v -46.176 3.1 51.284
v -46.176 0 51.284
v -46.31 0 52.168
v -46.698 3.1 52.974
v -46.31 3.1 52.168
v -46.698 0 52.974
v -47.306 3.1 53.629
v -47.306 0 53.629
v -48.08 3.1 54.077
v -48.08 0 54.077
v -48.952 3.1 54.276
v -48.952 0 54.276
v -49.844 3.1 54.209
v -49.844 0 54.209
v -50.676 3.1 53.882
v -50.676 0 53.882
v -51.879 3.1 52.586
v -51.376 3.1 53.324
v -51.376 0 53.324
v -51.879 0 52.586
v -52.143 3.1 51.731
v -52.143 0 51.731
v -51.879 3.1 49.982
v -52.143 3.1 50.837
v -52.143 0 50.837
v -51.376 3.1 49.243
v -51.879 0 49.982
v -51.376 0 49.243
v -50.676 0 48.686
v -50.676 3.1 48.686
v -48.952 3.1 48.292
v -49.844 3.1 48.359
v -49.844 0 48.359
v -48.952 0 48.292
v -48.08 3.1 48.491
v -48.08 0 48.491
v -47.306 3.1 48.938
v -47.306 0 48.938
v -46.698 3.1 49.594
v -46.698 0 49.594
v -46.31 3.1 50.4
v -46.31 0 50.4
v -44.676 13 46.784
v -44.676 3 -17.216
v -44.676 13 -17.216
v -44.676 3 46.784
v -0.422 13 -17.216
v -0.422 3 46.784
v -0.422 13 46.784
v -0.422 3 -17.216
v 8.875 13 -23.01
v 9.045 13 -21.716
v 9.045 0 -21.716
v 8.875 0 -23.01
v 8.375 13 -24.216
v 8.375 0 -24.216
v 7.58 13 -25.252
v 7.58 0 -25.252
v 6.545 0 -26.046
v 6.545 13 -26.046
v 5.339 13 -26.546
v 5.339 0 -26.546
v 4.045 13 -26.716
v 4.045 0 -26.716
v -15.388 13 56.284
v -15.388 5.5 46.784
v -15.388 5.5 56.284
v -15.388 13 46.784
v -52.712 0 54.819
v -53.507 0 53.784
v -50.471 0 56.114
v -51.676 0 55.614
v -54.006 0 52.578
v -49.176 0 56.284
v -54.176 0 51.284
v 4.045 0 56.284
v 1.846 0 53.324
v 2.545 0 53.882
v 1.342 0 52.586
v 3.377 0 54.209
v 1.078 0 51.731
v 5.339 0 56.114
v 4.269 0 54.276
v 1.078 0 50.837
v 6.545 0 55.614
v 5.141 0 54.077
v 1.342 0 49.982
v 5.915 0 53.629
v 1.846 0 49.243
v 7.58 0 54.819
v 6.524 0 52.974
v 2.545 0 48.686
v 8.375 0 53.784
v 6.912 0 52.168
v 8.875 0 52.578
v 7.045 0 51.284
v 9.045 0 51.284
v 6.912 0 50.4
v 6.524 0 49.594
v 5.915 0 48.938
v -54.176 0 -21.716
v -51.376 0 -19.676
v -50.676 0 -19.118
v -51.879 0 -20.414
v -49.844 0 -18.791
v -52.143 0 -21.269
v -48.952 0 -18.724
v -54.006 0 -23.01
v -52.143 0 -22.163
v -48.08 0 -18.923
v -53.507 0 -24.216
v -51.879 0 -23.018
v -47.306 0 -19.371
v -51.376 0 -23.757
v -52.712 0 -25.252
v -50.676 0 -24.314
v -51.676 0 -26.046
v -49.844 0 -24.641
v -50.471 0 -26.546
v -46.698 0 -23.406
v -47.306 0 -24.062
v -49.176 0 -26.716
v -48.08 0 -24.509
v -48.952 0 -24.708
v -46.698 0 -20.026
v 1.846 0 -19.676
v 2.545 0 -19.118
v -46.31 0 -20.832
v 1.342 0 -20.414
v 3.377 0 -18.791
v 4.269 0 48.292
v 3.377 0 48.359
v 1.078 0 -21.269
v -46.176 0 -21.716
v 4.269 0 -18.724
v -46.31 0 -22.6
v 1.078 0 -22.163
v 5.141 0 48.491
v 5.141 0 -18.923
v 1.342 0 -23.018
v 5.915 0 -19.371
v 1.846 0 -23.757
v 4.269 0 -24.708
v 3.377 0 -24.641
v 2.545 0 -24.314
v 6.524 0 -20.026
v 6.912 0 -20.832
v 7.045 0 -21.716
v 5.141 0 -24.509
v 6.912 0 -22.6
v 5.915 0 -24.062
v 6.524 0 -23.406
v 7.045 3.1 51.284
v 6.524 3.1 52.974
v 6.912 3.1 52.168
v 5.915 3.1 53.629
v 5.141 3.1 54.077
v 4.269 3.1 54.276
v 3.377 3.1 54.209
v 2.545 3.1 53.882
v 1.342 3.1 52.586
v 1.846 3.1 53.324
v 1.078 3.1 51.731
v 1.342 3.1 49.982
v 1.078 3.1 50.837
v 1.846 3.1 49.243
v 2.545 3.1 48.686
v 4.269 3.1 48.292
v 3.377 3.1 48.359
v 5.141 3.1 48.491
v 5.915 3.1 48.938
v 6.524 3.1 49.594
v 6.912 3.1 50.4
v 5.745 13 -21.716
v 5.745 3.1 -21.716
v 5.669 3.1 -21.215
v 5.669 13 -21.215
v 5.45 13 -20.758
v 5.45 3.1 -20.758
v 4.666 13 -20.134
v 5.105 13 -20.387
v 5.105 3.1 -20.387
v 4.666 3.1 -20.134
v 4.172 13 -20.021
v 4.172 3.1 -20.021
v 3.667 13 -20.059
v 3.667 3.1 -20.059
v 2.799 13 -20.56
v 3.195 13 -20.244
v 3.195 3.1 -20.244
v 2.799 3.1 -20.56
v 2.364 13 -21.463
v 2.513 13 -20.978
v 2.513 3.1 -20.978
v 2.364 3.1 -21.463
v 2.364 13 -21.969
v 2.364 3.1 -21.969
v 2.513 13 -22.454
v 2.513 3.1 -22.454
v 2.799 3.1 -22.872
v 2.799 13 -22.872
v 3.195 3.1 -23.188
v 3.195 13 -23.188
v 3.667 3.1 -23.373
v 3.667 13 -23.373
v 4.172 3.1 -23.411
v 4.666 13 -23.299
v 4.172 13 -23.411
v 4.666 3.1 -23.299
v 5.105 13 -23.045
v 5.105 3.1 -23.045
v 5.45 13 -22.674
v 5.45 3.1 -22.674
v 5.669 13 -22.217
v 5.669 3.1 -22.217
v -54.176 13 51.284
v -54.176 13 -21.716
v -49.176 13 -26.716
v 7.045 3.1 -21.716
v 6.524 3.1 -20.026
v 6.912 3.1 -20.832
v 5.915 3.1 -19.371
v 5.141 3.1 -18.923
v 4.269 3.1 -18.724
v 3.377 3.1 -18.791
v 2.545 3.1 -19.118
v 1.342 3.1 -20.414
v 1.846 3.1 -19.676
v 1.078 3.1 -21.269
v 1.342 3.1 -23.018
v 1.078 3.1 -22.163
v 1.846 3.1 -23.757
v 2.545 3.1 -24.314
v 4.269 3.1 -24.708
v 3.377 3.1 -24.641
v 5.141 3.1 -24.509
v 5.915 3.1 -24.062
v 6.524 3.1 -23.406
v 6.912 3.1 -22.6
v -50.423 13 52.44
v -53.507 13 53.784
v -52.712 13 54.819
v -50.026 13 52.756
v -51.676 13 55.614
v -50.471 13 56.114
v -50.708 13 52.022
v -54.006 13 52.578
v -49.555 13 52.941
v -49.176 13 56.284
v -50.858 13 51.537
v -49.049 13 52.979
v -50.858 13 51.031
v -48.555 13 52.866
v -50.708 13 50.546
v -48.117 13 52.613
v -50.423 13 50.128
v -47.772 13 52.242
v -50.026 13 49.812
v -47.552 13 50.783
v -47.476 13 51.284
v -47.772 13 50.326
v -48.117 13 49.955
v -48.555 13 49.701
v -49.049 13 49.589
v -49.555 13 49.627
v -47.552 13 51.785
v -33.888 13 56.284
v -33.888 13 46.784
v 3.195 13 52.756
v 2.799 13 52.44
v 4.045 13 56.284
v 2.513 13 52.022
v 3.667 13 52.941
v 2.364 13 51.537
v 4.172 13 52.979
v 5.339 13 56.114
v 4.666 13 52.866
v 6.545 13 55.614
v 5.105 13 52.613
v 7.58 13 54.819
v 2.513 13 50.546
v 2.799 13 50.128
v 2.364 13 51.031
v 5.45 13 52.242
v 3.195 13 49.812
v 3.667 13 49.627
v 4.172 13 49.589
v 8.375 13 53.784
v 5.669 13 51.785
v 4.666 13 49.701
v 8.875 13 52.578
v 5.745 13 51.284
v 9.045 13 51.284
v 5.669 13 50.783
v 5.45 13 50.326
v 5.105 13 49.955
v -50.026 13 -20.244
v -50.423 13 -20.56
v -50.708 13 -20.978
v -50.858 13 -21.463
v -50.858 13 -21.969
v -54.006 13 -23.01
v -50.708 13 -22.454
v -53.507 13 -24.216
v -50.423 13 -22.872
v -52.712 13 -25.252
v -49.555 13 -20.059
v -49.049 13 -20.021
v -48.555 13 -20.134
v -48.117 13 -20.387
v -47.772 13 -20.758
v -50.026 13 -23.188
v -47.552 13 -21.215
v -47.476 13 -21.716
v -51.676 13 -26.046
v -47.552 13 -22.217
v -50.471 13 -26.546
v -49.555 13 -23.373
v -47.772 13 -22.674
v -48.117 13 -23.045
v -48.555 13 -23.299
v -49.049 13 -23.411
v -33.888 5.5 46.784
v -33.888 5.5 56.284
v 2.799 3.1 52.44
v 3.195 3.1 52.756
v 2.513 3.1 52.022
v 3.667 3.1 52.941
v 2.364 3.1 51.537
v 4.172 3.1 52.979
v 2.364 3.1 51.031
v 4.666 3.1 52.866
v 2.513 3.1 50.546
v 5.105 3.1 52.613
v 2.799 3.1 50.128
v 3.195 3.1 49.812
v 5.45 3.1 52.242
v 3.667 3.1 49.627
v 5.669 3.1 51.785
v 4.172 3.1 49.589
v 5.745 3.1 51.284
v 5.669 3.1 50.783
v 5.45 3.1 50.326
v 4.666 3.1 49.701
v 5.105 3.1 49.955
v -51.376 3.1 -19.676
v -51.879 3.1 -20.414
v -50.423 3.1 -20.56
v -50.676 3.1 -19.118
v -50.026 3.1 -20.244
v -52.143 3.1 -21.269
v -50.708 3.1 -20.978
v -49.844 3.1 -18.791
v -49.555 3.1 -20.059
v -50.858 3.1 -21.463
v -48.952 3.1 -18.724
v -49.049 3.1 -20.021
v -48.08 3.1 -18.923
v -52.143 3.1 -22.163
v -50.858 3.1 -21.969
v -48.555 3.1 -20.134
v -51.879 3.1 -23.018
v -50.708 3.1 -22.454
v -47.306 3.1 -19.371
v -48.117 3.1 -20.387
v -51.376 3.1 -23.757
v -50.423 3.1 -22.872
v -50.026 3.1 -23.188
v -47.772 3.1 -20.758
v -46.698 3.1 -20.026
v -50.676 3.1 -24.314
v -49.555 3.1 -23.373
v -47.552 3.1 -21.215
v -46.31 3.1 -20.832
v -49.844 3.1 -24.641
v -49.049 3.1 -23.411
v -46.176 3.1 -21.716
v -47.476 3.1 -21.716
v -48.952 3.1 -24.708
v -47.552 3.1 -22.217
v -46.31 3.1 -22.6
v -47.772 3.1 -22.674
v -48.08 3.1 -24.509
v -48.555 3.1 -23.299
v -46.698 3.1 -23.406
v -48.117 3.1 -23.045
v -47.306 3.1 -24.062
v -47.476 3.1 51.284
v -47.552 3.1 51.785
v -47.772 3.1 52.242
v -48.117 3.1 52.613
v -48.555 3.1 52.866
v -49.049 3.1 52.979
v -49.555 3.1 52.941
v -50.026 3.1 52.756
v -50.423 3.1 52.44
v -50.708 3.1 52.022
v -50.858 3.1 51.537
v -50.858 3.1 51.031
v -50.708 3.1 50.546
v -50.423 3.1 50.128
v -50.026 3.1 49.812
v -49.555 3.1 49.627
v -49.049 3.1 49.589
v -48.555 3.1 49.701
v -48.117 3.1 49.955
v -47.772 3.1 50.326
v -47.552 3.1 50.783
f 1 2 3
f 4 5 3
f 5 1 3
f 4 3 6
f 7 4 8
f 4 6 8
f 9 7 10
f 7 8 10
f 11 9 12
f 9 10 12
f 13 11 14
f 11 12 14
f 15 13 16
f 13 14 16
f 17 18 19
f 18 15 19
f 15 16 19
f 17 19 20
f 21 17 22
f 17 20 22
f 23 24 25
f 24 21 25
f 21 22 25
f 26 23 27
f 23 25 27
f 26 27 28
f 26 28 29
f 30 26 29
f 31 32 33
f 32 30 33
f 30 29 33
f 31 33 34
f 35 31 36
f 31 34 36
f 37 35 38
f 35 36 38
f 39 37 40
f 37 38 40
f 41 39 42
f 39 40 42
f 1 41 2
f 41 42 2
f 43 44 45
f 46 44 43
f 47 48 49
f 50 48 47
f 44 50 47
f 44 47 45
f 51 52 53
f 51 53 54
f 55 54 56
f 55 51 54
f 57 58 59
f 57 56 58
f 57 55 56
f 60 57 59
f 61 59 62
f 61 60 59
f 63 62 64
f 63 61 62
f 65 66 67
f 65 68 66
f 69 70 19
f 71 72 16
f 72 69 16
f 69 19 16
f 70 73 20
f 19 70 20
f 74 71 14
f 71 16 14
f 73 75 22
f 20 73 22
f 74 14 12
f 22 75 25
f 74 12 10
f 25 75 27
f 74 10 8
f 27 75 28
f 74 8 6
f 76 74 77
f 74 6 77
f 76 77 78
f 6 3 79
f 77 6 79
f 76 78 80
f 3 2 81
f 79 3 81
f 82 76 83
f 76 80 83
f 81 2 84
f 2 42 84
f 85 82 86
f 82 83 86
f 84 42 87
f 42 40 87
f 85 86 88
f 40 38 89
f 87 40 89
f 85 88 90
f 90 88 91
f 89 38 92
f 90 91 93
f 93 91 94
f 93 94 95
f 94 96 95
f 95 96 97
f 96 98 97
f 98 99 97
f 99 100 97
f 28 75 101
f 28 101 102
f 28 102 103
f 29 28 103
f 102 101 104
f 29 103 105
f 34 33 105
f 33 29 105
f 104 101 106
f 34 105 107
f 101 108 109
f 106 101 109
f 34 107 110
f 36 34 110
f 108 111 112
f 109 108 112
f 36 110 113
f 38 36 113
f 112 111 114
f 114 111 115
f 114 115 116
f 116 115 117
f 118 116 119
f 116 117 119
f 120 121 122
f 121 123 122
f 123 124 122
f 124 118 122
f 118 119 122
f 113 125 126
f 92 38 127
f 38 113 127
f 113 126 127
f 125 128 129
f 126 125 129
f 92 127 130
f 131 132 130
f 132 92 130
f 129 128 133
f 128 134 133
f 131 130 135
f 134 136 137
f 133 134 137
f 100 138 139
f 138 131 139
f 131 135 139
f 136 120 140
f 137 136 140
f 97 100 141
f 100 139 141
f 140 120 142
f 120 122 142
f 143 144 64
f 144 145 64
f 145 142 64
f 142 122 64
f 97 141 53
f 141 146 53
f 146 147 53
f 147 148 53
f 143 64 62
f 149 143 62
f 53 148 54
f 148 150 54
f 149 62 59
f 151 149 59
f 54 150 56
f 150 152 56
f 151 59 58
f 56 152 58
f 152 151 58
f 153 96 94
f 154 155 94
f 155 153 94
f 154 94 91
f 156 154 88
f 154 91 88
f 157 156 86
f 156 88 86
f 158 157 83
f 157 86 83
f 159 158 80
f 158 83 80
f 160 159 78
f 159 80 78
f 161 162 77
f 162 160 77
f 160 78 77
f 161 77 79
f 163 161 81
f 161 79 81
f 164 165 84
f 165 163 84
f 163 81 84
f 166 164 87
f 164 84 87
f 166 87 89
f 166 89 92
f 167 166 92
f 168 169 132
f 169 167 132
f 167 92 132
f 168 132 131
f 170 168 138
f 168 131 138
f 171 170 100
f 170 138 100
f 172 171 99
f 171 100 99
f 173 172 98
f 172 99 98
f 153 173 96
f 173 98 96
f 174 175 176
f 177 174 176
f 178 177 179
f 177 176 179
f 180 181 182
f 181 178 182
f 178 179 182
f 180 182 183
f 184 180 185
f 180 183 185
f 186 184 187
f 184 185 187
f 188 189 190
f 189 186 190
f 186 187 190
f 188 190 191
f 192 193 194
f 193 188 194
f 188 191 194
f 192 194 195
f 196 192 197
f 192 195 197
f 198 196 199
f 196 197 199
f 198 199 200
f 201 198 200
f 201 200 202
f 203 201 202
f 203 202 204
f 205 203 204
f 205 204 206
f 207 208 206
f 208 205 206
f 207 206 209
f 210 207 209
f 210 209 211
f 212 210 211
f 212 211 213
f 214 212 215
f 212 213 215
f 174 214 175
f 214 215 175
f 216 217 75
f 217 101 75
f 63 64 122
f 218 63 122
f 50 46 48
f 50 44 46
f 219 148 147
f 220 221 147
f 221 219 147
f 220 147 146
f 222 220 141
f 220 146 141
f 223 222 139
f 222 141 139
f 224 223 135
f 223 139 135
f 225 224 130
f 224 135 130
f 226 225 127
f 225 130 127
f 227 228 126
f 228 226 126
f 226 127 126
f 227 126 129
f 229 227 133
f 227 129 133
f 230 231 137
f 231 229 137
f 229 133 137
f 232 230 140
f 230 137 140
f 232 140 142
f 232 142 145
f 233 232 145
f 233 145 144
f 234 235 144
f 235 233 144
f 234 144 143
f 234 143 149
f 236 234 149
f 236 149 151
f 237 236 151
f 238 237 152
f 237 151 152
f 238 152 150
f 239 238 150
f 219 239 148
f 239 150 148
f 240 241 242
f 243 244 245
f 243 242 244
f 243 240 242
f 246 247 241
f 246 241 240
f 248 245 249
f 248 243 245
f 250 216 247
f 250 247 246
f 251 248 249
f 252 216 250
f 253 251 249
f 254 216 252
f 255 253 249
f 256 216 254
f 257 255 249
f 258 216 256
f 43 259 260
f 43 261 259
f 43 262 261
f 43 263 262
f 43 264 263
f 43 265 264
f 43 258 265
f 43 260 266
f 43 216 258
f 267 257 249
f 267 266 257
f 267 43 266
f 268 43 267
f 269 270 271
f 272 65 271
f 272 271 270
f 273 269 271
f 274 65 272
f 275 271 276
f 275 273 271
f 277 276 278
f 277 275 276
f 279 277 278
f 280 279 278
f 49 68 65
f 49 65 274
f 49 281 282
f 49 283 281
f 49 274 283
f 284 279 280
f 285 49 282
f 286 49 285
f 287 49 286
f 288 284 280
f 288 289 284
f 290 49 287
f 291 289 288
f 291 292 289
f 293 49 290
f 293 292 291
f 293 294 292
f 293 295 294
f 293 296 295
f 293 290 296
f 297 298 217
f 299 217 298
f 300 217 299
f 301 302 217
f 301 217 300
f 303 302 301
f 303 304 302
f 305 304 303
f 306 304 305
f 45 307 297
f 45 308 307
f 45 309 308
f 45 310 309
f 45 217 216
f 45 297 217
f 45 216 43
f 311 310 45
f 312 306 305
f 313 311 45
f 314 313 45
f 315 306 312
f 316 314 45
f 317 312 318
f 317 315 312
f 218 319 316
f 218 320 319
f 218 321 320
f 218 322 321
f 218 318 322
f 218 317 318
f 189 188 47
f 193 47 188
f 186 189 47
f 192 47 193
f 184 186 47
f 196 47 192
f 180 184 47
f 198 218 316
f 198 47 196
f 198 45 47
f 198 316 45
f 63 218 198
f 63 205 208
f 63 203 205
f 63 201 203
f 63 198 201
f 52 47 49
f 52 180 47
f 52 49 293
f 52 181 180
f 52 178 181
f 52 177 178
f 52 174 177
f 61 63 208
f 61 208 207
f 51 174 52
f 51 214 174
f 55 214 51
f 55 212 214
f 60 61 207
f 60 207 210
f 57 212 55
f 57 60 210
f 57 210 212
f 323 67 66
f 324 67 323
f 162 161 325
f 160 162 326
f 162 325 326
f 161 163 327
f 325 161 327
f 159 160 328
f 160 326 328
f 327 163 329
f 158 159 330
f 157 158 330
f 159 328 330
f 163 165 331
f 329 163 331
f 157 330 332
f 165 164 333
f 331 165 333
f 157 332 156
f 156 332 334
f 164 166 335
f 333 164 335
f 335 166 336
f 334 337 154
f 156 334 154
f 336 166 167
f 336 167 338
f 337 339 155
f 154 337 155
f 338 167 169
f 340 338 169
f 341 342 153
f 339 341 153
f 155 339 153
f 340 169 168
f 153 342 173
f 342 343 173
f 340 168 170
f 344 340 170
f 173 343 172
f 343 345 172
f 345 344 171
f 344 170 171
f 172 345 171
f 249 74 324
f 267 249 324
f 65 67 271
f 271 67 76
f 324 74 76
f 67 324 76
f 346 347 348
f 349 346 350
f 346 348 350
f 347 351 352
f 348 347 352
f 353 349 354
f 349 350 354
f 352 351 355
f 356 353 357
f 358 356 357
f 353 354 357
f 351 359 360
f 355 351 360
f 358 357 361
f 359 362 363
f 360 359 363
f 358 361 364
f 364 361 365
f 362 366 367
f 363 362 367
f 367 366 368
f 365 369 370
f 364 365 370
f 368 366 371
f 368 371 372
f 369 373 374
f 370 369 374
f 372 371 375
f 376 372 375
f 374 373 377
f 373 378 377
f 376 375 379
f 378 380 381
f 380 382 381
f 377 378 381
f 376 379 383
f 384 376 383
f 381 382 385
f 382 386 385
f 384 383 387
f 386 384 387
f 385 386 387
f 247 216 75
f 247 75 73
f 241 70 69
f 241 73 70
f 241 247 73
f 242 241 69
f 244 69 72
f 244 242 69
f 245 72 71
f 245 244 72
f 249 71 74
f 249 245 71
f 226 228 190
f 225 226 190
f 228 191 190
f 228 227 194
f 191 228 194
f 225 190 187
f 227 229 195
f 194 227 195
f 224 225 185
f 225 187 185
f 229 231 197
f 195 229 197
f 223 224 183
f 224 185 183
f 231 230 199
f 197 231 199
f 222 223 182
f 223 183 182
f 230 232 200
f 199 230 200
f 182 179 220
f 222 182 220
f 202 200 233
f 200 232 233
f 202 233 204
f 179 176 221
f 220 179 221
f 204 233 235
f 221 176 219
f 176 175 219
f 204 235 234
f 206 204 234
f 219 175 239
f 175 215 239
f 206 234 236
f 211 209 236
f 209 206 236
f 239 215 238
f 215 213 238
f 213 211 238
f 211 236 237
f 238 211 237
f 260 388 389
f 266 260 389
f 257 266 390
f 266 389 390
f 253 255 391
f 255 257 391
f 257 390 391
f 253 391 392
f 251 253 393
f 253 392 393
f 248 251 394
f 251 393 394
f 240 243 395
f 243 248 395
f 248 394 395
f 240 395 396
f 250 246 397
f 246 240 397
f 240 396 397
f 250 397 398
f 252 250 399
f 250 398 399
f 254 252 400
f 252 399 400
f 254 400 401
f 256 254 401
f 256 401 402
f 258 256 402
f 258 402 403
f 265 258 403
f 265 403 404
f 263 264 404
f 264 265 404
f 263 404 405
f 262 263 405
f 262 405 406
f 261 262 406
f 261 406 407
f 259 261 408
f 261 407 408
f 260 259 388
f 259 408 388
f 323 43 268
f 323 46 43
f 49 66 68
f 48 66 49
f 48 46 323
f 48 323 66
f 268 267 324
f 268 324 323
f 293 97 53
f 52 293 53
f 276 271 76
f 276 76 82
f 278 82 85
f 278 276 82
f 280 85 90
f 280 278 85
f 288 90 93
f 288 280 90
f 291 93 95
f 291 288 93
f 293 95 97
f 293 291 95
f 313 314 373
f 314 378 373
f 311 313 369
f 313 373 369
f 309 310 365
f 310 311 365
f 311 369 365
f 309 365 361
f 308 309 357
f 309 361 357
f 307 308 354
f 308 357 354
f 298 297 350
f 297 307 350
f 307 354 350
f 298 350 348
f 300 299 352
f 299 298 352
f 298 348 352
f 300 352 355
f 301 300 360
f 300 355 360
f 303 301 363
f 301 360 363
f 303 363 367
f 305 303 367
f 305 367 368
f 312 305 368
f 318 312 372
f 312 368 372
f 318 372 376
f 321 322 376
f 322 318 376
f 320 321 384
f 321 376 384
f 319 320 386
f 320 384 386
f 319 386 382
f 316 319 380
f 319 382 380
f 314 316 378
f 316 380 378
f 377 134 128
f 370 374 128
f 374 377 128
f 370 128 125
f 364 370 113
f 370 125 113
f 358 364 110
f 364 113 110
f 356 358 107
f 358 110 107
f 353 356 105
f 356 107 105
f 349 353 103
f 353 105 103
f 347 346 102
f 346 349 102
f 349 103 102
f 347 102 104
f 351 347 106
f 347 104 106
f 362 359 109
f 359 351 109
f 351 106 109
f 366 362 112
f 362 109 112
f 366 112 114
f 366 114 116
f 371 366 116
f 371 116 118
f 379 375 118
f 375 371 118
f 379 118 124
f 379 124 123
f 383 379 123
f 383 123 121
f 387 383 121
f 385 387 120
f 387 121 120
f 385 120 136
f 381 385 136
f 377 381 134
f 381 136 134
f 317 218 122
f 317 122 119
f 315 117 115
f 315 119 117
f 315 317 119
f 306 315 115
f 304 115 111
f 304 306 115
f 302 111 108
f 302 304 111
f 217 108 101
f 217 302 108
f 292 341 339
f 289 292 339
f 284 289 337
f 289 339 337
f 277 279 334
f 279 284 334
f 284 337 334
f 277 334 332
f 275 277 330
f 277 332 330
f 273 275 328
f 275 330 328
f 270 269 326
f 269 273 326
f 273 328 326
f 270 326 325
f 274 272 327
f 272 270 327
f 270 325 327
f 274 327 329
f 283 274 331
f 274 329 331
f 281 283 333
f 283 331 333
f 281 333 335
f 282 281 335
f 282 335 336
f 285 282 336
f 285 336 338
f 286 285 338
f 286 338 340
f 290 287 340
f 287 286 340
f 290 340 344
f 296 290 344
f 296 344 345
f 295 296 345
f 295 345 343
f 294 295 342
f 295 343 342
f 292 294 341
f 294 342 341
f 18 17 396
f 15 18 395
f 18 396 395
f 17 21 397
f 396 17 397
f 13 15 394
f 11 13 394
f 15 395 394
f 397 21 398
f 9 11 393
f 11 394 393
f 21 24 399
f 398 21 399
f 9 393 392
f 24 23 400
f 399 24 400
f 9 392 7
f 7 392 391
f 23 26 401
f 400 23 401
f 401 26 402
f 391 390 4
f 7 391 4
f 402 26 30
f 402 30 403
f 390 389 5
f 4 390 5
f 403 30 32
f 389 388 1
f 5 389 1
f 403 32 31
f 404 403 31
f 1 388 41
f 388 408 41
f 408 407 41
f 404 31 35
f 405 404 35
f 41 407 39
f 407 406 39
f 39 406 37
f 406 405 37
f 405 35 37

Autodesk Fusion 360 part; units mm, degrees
sketch "Sketch1" plane through (0, 0, 0) normal (0, 1, 0) x (1, 0, 0)
  line L0 (-44.6765, -46.7839) -> (-0.4215, -46.7839)
  line L1 (-0.4215, -46.7839) -> (-0.4215, 17.2161)
  line L2 (-0.4215, 17.2161) -> (-44.6765, 17.2161)
  line L3 (-44.6765, 17.2161) -> (-44.6765, -46.7839)
  line L4 (-54.1765, -56.2839) -> (9.0449, -56.2839)
  line L5 (9.0449, -56.2839) -> (9.0449, 26.7161)
  line L6 (9.0449, 26.7161) -> (-54.1765, 26.7161)
  line L7 (-54.1765, 26.7161) -> (-54.1765, -56.2839)
  circle A0 centre (-49.1765, -51.2839) radius 1.7
  circle A1 centre (-49.1765, 21.7161) radius 1.7
  circle A2 centre (4.0449, 21.7161) radius 1.7
  circle A3 centre (4.0449, -51.2839) radius 1.7
  circle A4 centre (-49.1765, -51.2839) radius 3
  circle A5 centre (4.0449, -51.2839) radius 3
  circle A6 centre (4.0449, 21.7161) radius 3
  circle A7 centre (-49.1765, 21.7161) radius 3
  dimension "d1" = 64
  dimension "d2" = 83
  dimension "d3" = 9.5
  dimension "d4" = 9.5
  dimension "d5" = 3.4
  dimension "d6" = 5
  dimension "d7" = 5
  dimension "d8" = 3.4
  dimension "d9" = 63.2214
  dimension "d10" = 5
  dimension "d11" = 5
  dimension "d12" = 3.4
  dimension "d13" = 5
  dimension "d14" = 5
  dimension "d15" = 3.4
  dimension "d16" = 5
  dimension "d17" = 5
  dimension "d18" = 6
  dimension "d19" = 6
  dimension "d20" = 6
  dimension "d21" = 6
extrude "Extrude1" add sketch "Sketch1" along normal blind 9.9 from surface at 3.1 contours A4 | A5 | A6 | A7 makes body 1 at (-51.5679, 9.7, 49.4724) makes body 2 at (7.0412, 9.7, -21.5666) makes body 3 at (7.0412, 9.7, 51.4334) makes body 4 at (-46.1802, 9.7, -21.5666)
extrude "Extrude2" add sketch "Sketch1" along normal blind 13 contours L4 L5 L6 L7 bodies 1 2 3 4
extrude "Extrude3" add sketch "Sketch1" along normal blind 3 contours L0 L1 L2 L3 bodies 1
sketch "Sketch2" plane through (0, 13, 0) normal (0, 1, 0) x (-1, 0, 0)
  circle A0 centre (49.1765, 51.2839) radius 1.7
  circle A1 centre (49.1765, -21.7161) radius 1.7
  line L0 (44.6765, 46.7839) -> (44.6765, -17.2161)
  line L1 (44.6765, -17.2161) -> (0.4215, -17.2161)
  line L2 (0.4215, -17.2161) -> (0.4215, 46.7839)
  line L3 (0.4215, 46.7839) -> (44.6765, 46.7839)
  line L4 (54.1765, -26.7161) -> (54.1765, 56.2839)
  line L5 (54.1765, 56.2839) -> (-9.0449, 56.2839)
  line L6 (-9.0449, 56.2839) -> (-9.0449, -26.7161)
  line L7 (-9.0449, -26.7161) -> (54.1765, -26.7161)
  circle A2 centre (-4.0449, -21.7161) radius 1.7
  circle A3 centre (-4.0449, 51.2839) radius 1.7
  line L8 (15.3881, 56.2839) -> (33.8881, 56.2839)
  line L9 (33.8881, 56.2839) -> (33.8881, 46.7839)
  line L10 (33.8881, 46.7839) -> (15.3881, 46.7839)
  line L11 (15.3881, 46.7839) -> (15.3881, 56.2839)
  line L12 (-9.0449, 56.2839) -> (-9.0449, -26.7161)
  dimension "d29" = 18.5
  dimension "d30" = 24.433
extrude "Extrude4" cut sketch "Sketch2" against normal blind 7.5 contours L3 L5 L8 L9 L10 L11 bodies 1
fillet "Fillet1" radius 5 1 edges at (9.0449, 6.5, 56.2839) on bodies 1
fillet "Fillet2" radius 5 1 edges at (-54.1765, 6.5, 56.2839) on bodies 1
fillet "Fillet3" radius 5 1 edges at (-54.1765, 6.5, -26.7161) on bodies 1
fillet "Fillet4" radius 5 1 edges at (9.0449, 6.5, -26.7161) on bodies 1
